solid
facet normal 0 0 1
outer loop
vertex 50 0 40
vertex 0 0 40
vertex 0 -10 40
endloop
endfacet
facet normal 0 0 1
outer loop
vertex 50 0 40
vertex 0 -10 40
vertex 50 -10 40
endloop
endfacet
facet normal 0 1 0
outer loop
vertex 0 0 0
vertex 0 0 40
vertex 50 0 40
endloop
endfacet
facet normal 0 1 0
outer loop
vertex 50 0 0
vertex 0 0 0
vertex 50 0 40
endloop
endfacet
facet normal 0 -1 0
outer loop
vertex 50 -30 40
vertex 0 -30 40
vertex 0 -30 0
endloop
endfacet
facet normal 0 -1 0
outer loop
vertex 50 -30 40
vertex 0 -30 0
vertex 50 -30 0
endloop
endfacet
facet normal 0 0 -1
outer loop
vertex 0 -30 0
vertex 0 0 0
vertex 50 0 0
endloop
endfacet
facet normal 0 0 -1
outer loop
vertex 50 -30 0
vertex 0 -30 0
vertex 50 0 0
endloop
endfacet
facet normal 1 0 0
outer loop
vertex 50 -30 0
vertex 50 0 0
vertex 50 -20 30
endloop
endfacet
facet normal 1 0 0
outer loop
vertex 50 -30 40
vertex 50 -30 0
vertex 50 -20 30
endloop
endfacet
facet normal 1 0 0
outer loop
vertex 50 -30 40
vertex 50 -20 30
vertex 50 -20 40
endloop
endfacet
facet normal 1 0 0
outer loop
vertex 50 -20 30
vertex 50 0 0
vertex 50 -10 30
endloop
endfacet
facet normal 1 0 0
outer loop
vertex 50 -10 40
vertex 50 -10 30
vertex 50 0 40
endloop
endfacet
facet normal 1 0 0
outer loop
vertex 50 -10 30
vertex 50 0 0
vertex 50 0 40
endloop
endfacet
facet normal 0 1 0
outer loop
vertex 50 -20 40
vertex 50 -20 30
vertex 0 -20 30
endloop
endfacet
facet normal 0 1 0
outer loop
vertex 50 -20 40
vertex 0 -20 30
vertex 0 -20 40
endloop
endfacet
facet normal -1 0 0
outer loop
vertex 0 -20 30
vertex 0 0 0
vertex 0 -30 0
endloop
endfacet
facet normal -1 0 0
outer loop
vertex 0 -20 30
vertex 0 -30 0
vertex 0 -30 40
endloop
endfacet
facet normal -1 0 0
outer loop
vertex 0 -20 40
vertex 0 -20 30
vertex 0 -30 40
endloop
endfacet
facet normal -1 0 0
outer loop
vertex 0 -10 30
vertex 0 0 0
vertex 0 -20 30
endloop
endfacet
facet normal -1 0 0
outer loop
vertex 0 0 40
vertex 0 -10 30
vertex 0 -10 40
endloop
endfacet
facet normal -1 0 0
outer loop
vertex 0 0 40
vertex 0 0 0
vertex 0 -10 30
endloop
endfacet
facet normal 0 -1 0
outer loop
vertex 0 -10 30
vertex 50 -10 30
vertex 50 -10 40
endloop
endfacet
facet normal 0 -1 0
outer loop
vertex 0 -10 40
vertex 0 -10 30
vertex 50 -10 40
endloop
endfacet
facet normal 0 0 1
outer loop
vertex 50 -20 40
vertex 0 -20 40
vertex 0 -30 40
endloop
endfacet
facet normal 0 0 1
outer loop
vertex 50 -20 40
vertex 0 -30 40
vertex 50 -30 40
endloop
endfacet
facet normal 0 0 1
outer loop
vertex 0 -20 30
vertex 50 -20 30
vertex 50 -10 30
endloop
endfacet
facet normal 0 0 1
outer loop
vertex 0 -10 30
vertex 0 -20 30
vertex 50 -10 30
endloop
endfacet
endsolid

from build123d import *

# Parameters (mm, degrees)
F0_W      = 50
F0_H      = 40
F1_DEPTH  = 30
F2_W      = 10
F2_H      = 10
F3_DEPTH  = 50
F3_FACE_W = 10
F3_FACE_H = 10
F4_DEPTH  = 100


with BuildPart() as f1:
    # F0 (on Front) → F1 (new body)
    with BuildSketch(Plane.XZ):
        with Locations((25, 20)):
            Rectangle(F0_W, F0_H)
    extrude(amount=F1_DEPTH)

    # F2 (on face) → F3 (join)
    with BuildSketch(Plane.YZ.offset(50)):
        with Locations((-15, 35)):
            Rectangle(F2_W, F2_H)
    extrude(amount=F3_DEPTH)

    # F3_face (on face) → F4 (cut)
    with BuildSketch(Plane(origin=(100, -15, 35), x_dir=(0, 1, 0), z_dir=(1, 0, 0))):
        Rectangle(F3_FACE_W, F3_FACE_H)
    extrude(amount=-F4_DEPTH, mode=Mode.SUBTRACT)


solid = f1.part
